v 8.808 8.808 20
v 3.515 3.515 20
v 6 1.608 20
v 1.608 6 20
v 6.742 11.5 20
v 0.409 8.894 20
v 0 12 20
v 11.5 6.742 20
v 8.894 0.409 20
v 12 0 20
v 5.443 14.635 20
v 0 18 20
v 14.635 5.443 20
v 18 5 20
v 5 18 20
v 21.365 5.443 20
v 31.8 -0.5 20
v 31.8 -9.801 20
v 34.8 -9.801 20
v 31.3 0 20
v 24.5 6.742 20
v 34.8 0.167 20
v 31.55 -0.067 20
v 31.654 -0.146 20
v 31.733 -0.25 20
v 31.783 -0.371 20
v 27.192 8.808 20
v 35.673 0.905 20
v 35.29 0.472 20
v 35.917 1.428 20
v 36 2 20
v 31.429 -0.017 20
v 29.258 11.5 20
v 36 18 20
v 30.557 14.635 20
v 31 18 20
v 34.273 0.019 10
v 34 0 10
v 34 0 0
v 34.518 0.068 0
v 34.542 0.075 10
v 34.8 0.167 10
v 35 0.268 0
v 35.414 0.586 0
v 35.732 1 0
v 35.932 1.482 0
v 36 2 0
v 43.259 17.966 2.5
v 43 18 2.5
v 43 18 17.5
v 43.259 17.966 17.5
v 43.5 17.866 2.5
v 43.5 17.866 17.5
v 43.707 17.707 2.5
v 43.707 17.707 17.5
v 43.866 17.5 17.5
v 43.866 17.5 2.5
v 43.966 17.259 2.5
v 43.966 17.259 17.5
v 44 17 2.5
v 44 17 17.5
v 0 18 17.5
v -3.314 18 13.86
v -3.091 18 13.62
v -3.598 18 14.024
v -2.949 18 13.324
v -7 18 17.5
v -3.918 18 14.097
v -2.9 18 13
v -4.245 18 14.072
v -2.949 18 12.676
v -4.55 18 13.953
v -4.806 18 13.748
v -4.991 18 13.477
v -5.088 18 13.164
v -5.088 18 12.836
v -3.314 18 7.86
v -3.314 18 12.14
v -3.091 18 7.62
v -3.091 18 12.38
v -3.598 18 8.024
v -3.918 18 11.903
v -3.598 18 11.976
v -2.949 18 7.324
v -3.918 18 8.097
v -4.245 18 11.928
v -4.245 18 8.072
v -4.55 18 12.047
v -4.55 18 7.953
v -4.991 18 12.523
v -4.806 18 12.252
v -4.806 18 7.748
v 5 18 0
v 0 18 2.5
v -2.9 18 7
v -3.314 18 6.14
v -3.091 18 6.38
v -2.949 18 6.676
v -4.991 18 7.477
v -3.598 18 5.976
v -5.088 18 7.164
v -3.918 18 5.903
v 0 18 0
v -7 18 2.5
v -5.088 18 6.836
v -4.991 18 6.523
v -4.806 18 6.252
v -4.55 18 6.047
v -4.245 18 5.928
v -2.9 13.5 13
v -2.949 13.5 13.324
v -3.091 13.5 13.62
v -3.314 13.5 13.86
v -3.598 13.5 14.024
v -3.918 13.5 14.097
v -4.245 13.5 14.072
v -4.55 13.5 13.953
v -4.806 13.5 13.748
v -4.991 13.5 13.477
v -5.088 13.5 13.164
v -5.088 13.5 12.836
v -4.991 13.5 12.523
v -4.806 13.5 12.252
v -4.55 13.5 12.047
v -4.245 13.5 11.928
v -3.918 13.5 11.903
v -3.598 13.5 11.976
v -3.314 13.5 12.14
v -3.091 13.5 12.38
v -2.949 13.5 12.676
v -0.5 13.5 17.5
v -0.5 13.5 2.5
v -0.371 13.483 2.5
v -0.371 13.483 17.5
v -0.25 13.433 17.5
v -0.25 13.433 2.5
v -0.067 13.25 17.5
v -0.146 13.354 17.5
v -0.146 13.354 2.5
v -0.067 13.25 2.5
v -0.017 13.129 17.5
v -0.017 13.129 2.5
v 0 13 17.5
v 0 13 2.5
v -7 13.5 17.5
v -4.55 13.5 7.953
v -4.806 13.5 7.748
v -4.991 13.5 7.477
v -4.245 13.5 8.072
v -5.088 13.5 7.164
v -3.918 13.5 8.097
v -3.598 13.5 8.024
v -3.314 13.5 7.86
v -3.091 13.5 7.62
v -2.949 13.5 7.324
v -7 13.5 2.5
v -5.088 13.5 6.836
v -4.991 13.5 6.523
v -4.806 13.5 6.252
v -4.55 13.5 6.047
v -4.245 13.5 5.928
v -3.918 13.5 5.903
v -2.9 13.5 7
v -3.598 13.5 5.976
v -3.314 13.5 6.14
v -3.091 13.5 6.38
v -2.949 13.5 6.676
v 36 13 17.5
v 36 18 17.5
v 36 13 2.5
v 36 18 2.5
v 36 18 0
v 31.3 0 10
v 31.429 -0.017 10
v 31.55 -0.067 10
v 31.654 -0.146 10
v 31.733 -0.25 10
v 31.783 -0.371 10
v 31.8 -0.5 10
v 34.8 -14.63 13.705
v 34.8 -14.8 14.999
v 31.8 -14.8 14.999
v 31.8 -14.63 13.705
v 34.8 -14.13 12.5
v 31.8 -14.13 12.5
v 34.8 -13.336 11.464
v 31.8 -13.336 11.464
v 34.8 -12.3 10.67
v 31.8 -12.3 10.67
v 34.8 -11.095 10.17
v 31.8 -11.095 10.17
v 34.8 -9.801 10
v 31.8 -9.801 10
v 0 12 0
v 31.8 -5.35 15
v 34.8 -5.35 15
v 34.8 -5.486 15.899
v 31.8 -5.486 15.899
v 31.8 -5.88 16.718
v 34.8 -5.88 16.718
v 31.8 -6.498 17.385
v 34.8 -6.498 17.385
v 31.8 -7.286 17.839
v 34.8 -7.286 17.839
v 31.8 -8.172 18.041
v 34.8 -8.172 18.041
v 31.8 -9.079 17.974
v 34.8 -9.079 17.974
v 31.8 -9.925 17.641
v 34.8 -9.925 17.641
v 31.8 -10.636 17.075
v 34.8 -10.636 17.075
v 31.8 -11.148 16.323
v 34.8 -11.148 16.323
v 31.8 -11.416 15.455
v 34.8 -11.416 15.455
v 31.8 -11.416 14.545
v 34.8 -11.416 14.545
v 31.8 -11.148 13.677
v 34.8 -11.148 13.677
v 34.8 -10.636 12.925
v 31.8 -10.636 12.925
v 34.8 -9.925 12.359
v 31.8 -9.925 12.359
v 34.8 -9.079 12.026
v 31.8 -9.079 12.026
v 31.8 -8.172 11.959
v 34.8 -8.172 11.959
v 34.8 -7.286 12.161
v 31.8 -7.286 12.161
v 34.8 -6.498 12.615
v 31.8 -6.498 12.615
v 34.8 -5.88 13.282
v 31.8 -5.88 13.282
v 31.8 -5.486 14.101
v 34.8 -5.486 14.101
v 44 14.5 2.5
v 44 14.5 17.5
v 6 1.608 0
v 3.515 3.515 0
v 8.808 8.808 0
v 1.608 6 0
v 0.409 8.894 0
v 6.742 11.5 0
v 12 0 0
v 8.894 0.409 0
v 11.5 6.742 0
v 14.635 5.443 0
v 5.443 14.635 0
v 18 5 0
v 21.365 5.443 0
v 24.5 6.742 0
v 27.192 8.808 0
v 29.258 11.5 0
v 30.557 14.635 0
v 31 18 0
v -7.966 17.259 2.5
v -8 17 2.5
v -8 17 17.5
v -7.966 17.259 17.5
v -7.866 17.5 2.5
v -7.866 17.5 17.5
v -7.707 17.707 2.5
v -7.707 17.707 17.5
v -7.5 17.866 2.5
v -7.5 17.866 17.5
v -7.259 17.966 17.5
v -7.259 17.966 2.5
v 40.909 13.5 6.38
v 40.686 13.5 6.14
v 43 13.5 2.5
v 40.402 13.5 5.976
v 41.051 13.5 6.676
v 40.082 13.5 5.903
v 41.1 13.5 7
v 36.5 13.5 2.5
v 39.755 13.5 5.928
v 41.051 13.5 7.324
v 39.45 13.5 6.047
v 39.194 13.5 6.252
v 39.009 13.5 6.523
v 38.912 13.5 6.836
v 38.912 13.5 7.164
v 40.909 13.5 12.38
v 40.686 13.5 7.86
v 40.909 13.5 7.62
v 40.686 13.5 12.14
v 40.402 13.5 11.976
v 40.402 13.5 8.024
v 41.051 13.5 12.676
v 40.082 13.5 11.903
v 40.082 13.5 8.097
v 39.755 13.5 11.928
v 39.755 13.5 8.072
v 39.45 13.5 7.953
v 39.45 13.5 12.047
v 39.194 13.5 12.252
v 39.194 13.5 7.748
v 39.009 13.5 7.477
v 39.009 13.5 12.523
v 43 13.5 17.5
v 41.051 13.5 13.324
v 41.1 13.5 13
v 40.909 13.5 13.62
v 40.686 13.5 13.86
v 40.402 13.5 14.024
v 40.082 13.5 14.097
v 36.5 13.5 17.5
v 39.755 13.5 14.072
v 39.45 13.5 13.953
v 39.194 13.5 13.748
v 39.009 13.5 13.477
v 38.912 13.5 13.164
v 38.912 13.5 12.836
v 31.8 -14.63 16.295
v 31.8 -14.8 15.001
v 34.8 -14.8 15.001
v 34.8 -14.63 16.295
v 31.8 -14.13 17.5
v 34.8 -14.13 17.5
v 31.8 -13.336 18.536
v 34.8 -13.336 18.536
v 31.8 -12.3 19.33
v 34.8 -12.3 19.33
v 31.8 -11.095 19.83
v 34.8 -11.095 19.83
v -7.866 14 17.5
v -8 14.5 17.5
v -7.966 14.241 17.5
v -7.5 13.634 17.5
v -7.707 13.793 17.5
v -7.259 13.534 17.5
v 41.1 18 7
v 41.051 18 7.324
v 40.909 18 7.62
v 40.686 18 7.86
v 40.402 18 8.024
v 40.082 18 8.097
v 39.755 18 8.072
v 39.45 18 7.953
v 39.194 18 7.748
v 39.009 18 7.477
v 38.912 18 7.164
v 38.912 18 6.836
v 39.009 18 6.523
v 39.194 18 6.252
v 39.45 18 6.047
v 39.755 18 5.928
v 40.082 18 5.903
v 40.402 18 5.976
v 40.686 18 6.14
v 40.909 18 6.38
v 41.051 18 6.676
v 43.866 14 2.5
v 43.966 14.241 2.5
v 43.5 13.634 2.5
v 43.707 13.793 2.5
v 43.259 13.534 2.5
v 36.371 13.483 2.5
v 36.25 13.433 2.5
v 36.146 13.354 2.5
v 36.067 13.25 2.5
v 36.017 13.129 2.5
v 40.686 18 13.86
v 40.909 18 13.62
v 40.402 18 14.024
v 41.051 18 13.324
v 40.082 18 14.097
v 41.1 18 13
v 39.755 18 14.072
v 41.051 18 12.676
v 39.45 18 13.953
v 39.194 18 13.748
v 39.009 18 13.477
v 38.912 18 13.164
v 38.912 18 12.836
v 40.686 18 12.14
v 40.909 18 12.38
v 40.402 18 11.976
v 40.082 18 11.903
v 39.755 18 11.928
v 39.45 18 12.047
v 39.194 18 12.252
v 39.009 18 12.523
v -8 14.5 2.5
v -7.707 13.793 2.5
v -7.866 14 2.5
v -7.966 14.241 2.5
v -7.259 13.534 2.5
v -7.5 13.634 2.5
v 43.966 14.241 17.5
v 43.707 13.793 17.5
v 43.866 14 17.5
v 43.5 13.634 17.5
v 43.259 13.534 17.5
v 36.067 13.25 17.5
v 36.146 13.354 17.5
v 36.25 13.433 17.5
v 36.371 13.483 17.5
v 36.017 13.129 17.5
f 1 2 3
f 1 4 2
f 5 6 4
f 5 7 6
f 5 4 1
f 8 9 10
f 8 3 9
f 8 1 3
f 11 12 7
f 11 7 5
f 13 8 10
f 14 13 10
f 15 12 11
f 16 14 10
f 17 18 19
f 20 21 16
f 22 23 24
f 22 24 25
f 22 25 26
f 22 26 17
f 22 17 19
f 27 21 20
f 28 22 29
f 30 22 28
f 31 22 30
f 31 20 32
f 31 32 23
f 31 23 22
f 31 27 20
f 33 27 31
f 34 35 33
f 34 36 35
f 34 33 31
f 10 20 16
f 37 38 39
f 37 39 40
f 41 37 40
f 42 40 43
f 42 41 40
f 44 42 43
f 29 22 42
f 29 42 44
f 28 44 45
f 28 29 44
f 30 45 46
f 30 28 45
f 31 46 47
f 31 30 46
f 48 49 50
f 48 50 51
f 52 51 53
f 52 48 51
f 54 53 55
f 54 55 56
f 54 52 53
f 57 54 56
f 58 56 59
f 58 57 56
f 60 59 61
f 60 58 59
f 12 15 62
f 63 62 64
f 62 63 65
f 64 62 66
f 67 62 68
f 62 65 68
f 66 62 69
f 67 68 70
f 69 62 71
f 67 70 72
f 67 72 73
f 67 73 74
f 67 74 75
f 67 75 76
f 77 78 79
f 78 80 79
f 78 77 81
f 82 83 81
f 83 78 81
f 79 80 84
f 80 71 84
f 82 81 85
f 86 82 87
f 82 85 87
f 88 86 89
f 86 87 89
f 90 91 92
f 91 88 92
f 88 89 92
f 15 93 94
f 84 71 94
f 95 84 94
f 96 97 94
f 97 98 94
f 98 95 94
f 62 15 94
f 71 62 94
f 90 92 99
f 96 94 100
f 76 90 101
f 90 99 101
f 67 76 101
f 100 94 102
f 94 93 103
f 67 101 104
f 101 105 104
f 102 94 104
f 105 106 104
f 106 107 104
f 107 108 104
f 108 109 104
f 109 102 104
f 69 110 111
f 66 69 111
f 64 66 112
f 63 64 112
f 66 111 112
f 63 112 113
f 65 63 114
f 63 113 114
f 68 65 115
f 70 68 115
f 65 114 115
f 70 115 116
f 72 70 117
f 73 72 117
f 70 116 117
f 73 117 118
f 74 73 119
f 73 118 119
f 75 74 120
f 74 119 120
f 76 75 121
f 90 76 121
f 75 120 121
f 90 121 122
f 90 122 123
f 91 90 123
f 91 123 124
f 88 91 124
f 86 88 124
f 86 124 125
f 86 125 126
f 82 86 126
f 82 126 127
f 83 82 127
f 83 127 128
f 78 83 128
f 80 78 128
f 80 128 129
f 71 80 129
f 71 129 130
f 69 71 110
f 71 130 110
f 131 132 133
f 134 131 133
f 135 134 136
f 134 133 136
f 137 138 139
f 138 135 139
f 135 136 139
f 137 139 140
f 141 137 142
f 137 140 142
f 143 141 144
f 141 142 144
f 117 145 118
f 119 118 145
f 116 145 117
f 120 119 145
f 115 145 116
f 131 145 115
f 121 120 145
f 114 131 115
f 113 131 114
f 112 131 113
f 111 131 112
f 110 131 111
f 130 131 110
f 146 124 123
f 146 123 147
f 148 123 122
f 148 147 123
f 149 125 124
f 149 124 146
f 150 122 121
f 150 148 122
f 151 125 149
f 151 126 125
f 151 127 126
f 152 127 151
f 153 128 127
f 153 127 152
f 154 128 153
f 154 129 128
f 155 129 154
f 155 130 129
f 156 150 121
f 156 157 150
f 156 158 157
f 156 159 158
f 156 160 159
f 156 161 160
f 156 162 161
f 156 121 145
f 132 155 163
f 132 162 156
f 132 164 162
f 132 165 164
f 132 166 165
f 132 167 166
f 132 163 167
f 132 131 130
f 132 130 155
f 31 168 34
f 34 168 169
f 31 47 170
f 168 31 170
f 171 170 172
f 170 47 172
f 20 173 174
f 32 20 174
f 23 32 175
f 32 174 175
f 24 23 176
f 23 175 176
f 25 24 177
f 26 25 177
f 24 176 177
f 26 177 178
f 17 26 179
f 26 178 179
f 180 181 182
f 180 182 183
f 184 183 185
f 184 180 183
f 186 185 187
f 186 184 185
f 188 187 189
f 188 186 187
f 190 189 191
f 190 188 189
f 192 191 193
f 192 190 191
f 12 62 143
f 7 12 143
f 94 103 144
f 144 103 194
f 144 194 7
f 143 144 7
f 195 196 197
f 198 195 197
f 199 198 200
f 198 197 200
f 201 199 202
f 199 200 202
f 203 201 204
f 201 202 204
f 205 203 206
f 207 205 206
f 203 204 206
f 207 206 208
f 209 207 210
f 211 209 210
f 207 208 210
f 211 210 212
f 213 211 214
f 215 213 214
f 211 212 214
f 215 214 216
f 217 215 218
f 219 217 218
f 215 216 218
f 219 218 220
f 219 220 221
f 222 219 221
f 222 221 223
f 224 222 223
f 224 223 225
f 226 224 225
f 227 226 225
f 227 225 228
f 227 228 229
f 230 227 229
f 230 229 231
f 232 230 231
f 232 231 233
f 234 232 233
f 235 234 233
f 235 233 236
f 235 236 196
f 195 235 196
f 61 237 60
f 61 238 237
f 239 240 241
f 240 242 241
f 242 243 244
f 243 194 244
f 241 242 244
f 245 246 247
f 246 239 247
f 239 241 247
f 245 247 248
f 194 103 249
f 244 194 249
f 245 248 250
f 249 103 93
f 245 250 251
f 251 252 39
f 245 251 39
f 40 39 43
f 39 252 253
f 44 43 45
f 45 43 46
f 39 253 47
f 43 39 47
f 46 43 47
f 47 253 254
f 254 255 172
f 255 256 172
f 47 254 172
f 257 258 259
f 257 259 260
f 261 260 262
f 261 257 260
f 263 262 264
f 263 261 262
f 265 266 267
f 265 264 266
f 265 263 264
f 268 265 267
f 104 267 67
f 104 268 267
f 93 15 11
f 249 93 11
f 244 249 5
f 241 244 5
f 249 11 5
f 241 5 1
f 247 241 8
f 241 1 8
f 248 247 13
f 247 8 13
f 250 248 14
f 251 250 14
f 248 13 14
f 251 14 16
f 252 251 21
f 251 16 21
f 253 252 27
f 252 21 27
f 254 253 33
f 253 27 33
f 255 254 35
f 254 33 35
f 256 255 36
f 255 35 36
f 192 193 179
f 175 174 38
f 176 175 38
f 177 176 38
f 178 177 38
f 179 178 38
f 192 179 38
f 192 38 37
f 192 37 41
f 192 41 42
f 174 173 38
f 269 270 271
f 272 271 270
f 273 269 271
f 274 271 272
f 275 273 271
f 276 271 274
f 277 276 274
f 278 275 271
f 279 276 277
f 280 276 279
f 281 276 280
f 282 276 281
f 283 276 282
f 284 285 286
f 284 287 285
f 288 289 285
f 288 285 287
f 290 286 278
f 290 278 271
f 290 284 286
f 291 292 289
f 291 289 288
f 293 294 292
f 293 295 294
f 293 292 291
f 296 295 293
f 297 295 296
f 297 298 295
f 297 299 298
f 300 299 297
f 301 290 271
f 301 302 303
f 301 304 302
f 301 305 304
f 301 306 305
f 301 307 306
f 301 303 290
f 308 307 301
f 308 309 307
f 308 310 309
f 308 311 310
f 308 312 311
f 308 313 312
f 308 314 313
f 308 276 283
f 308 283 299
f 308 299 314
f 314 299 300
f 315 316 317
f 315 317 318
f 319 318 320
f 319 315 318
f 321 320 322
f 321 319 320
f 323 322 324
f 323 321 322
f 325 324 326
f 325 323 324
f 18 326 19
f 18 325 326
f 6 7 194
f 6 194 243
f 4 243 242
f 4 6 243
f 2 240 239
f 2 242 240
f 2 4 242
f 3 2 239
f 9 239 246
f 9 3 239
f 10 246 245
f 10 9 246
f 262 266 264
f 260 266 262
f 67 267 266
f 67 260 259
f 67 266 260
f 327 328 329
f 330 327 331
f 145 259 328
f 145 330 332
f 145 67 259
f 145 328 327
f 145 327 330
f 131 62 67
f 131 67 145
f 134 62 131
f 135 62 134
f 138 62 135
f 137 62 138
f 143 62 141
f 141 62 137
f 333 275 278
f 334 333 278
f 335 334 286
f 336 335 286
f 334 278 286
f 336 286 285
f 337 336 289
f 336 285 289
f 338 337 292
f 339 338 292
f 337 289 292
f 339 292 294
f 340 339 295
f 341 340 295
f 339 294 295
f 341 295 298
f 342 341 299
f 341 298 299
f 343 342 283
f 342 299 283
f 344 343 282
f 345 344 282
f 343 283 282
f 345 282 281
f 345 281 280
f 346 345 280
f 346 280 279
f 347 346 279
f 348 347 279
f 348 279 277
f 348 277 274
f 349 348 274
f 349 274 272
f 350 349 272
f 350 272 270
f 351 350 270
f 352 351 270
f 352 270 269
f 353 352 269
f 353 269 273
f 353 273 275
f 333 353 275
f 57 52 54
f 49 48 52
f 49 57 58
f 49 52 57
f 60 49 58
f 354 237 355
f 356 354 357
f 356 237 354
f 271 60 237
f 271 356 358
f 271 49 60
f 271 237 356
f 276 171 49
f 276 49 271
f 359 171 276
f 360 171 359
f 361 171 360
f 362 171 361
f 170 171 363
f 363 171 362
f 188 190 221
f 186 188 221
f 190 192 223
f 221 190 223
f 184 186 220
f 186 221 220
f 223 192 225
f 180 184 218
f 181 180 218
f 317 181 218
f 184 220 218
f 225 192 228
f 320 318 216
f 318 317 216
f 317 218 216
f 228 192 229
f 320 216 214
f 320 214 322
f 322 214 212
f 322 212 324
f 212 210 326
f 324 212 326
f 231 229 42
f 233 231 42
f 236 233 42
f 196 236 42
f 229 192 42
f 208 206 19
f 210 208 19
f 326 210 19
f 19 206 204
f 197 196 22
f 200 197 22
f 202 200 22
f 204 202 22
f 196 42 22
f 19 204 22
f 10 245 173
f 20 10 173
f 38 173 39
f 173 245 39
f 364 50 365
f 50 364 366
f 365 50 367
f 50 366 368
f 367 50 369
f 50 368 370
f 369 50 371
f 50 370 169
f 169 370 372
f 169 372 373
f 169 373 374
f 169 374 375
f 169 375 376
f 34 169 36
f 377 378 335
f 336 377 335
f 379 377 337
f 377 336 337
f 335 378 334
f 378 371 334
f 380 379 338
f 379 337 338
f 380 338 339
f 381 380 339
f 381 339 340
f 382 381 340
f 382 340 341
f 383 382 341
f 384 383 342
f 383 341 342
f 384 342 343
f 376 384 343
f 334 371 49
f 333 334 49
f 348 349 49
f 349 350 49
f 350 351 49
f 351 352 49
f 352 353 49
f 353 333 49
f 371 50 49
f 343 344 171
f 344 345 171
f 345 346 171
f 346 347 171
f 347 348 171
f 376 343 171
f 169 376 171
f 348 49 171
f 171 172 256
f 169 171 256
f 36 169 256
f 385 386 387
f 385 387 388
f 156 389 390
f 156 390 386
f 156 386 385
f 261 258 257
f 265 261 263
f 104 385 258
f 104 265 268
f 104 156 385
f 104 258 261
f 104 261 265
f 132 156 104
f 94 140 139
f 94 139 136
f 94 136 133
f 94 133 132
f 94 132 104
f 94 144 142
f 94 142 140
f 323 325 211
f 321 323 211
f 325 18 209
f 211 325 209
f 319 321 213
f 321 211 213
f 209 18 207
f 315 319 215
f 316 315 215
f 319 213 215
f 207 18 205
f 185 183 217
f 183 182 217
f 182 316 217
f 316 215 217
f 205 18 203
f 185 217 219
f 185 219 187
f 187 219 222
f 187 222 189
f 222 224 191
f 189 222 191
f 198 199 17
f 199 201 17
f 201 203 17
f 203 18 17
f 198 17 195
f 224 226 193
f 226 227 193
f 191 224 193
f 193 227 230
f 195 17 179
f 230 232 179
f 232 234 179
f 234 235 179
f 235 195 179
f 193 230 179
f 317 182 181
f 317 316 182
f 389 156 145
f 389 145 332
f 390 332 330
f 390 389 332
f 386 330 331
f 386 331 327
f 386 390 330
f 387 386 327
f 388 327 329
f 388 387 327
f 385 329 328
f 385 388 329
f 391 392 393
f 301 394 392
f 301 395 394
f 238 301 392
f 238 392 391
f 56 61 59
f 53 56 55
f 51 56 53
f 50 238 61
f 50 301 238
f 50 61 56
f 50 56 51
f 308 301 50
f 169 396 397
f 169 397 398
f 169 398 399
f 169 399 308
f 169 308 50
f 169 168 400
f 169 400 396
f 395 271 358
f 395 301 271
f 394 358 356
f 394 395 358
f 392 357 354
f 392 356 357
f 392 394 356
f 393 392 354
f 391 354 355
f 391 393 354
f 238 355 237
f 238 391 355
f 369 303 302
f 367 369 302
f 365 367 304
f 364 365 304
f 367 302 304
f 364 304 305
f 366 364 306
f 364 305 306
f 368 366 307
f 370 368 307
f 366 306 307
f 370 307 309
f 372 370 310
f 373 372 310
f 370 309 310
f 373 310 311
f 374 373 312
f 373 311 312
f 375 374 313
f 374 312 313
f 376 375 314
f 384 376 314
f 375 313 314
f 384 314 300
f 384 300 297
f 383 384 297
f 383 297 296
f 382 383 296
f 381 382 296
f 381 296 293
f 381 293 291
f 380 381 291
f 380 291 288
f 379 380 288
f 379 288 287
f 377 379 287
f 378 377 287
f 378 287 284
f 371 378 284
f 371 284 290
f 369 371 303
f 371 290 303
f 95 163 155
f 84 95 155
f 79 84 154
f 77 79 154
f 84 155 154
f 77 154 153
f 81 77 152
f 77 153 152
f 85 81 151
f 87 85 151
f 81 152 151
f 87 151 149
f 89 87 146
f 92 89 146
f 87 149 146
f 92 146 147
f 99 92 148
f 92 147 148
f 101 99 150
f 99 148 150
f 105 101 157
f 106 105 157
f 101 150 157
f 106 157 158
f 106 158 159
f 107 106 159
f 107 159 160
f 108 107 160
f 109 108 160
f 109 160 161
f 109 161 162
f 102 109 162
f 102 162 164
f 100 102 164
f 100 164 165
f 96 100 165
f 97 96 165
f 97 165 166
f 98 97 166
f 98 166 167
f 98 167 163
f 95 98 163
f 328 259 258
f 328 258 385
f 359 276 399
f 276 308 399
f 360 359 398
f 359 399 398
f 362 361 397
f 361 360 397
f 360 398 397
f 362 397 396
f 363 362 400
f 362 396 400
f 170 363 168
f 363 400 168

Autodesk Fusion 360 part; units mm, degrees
sketch "Sketch1" plane through (0, 0, 0) normal (0, 0, 1) x (1, 0, 0)
  line L0 (0, 0) -> (36, 0)
  line L1 (36, 0) -> (36, 18)
  line L2 (36, 18) -> (0, 18)
  line L3 (0, 18) -> (0, 0)
  dimension "d1" = 36
  dimension "d2" = 18
extrude "Extrude1" add sketch "Sketch1" along normal blind 20
sketch "Sketch2" plane through (0, 0, 20) normal (0, 0, 1) x (-1, 0, 0)
  line L0 (0, -18) -> (0, 0)
  line L1 (0, 0) -> (-36, 0)
  line L2 (-36, 0) -> (-36, -18)
  line L3 (-36, -18) -> (0, -18)
  circle A0 centre (-18, -18) radius 13
  dimension "d5" = 26
extrude "Extrude2" cut sketch "Sketch2" against normal blind 20 contours L3 A0 picked at (-19.0768, -11.2377)
ref_plane "WorkPlane1" through (0, 20, 0) normal (0, 1, 0) x (0, 0, 1)
sketch "Sketch7" plane through (0, 0, 0) normal (0, -1, 0) x (1, 0, 0)
  line L0 (0, 0) -> (36, 0)
  line L1 (36, 20) -> (0, 20)
  line L2 (0, 20) -> (0, 0)
  line L3 (18, 10) -> (18, 23) construction
  line L4 (36, 0) -> (36, 20)
sketch "Sketch6" plane through (36, 0, 0) normal (1, 0, 0) x (0, 1, 0)
  line L0 (0, 0) -> (18, 0)
  line L1 (18, 0) -> (18, 20)
  line L2 (18, 20) -> (0, 20)
  line L3 (0, 20) -> (0, 0)
  line L4 (0, 20) -> (18, 0) construction
  line L5 (0, 0) -> (18, 20) construction
  line L6 (9, 10) -> (18, 10) construction
  line L7 (9, 10) -> (9, 0) construction
  line L8 (9, 10) -> (9, 20) construction
  line L9 (13.5, 17.5) -> (18, 17.5) construction
  line L10 (13.5, 5) -> (13.5, 10) construction
  line L11 (18, 7.5) -> (18, 12.5311)
  line L12 (13.5, 17.5) -> (18, 17.5)
  line L13 (18, 17.5) -> (18, 2.5)
  line L14 (18, 2.5) -> (13.5, 2.5)
  line L15 (13.5, 2.5) -> (13.5, 17.5)
  dimension "d25" = 15
  dimension "d26" = 4.5
  dimension "d34" = 7.5
extrude "Extrude7" add sketch "Sketch6" along normal blind 8 contours L1 L11 L12 L13 L14 L15
sketch "Sketch11" plane through (0, 13.5, 0) normal (0, -1, 0) x (1, 0, 0)
  line L0 (36, 17.5) -> (36, 2.5)
  line L1 (36, 2.5) -> (44, 2.5)
  line L2 (44, 2.5) -> (44, 17.5)
  line L3 (44, 17.5) -> (36, 17.5)
  circle A0 centre (40, 13) radius 1.1
  circle A1 centre (40, 7) radius 1.1
  line L4 (36, 0) -> (36, 20)
  line L5 (36, 20) -> (0, 20)
  line L6 (18, 10) -> (18, 23)
  circle A2 centre (-4, 13) radius 1.1
  circle A3 centre (-4, 7) radius 1.1
  dimension "d30" = 2.2
  dimension "d31" = 2.2
  dimension "d35" = 6
  dimension "d36" = 4
  dimension "d37" = 4
  dimension "d38" = 7
sketch "Sketch12" plane through (0, 0, 0) normal (-1, 0, 0) x (0, -1, 0)
  line L0 (-18, 0) -> (0, 0)
  line L1 (0, 0) -> (0, 20)
  line L2 (0, 20) -> (-18, 20)
  line L3 (-18, 20) -> (-18, 0)
  line L4 (-18, 17.5) -> (-13.5, 17.5)
  line L5 (-13.5, 17.5) -> (-13.5, 2.5)
  line L6 (-13.5, 2.5) -> (-18, 2.5)
  line L7 (-18, 2.5) -> (-18, 17.5)
  line L8 (-18, 10) -> (-8, 10) construction
  dimension "d39" = 15
  dimension "d40" = 7.5
  dimension "d41" = 4.5
extrude "Extrude8" add sketch "Sketch12" along normal blind 8 contours L3 L4 L5 L6 L7
extrude "Extrude9" cut sketch "Sketch11" against normal blind 4.5 contours A0 | A1 | A2 | A3
sketch "Sketch13" plane through (0, 0, 20) normal (0, 0, 1) x (-1, 0, 0)
  arc A0 (-5, -18) -> (-31, -18) centre (-18, -18) ccw
  line L0 (-5, -18) -> (0, -18)
  line L1 (0, -18) -> (0, 0)
  line L2 (0, 0) -> (-36, 0)
  line L3 (-36, 0) -> (-36, -18)
  line L4 (-36, -18) -> (-31, -18)
  line L5 (-34.8, -18) -> (-34.8, 0) construction
  dimension "d46" = 3.8
sketch "Sketch14" plane through (18, 0, 10) normal (0, -1, 0) x (1, 0, 0)
  line L0 (16.8, 10) -> (13.8, 10)
  line L1 (13.8, 10) -> (13.8, 0)
  line L2 (13.8, 0) -> (16.8, 0)
  line L3 (16.8, 0) -> (16.8, 10)
  point P0 (16.8, 10)
  dimension "d47" = 3
  dimension "d48" = 10
extrude "Extrude10" add sketch "Sketch14" along normal blind 14.8
sketch "Sketch15" plane through (34.8, 0, 0) normal (1, 0, 0) x (0, 1, 0)
  line L0 (0, 10) -> (0, 20)
  line L1 (0, 20) -> (-14.8, 20)
  line L2 (-14.8, 20) -> (-14.8, 10)
  line L3 (-14.8, 10) -> (0, 10)
  circle A0 centre (-8.4, 15) radius 3.05
  dimension "d51" = 6.1
  dimension "d52" = 6.4
  dimension "d53" = 5
extrude "Extrude11" cut sketch "Sketch15" against normal blind 3 contours A0
fillet "Fillet1" radius 5 2 edges at (33.3, -14.8, 20) (33.3, -14.8, 10)
fillet "Fillet2" radius 2 1 edges at (36, 0, 10)
fillet "Fillet3" radius 12 1 edges at (0, 0, 10)
fillet "Fillet4" radius 0.5 1 edges at (0, 13.5, 10)
fillet "Fillet5" radius 1 2 edges at (-8, 18, 10) (-8, 13.5, 10)
fillet "Fillet6" radius 1 2 edges at (44, 13.5, 10) (44, 18, 10)
fillet "Fillet7" radius 0.5 1 edges at (36, 13.5, 10)
fillet "Fillet8" radius 0.5 1 edges at (31.8, 0, 15)
